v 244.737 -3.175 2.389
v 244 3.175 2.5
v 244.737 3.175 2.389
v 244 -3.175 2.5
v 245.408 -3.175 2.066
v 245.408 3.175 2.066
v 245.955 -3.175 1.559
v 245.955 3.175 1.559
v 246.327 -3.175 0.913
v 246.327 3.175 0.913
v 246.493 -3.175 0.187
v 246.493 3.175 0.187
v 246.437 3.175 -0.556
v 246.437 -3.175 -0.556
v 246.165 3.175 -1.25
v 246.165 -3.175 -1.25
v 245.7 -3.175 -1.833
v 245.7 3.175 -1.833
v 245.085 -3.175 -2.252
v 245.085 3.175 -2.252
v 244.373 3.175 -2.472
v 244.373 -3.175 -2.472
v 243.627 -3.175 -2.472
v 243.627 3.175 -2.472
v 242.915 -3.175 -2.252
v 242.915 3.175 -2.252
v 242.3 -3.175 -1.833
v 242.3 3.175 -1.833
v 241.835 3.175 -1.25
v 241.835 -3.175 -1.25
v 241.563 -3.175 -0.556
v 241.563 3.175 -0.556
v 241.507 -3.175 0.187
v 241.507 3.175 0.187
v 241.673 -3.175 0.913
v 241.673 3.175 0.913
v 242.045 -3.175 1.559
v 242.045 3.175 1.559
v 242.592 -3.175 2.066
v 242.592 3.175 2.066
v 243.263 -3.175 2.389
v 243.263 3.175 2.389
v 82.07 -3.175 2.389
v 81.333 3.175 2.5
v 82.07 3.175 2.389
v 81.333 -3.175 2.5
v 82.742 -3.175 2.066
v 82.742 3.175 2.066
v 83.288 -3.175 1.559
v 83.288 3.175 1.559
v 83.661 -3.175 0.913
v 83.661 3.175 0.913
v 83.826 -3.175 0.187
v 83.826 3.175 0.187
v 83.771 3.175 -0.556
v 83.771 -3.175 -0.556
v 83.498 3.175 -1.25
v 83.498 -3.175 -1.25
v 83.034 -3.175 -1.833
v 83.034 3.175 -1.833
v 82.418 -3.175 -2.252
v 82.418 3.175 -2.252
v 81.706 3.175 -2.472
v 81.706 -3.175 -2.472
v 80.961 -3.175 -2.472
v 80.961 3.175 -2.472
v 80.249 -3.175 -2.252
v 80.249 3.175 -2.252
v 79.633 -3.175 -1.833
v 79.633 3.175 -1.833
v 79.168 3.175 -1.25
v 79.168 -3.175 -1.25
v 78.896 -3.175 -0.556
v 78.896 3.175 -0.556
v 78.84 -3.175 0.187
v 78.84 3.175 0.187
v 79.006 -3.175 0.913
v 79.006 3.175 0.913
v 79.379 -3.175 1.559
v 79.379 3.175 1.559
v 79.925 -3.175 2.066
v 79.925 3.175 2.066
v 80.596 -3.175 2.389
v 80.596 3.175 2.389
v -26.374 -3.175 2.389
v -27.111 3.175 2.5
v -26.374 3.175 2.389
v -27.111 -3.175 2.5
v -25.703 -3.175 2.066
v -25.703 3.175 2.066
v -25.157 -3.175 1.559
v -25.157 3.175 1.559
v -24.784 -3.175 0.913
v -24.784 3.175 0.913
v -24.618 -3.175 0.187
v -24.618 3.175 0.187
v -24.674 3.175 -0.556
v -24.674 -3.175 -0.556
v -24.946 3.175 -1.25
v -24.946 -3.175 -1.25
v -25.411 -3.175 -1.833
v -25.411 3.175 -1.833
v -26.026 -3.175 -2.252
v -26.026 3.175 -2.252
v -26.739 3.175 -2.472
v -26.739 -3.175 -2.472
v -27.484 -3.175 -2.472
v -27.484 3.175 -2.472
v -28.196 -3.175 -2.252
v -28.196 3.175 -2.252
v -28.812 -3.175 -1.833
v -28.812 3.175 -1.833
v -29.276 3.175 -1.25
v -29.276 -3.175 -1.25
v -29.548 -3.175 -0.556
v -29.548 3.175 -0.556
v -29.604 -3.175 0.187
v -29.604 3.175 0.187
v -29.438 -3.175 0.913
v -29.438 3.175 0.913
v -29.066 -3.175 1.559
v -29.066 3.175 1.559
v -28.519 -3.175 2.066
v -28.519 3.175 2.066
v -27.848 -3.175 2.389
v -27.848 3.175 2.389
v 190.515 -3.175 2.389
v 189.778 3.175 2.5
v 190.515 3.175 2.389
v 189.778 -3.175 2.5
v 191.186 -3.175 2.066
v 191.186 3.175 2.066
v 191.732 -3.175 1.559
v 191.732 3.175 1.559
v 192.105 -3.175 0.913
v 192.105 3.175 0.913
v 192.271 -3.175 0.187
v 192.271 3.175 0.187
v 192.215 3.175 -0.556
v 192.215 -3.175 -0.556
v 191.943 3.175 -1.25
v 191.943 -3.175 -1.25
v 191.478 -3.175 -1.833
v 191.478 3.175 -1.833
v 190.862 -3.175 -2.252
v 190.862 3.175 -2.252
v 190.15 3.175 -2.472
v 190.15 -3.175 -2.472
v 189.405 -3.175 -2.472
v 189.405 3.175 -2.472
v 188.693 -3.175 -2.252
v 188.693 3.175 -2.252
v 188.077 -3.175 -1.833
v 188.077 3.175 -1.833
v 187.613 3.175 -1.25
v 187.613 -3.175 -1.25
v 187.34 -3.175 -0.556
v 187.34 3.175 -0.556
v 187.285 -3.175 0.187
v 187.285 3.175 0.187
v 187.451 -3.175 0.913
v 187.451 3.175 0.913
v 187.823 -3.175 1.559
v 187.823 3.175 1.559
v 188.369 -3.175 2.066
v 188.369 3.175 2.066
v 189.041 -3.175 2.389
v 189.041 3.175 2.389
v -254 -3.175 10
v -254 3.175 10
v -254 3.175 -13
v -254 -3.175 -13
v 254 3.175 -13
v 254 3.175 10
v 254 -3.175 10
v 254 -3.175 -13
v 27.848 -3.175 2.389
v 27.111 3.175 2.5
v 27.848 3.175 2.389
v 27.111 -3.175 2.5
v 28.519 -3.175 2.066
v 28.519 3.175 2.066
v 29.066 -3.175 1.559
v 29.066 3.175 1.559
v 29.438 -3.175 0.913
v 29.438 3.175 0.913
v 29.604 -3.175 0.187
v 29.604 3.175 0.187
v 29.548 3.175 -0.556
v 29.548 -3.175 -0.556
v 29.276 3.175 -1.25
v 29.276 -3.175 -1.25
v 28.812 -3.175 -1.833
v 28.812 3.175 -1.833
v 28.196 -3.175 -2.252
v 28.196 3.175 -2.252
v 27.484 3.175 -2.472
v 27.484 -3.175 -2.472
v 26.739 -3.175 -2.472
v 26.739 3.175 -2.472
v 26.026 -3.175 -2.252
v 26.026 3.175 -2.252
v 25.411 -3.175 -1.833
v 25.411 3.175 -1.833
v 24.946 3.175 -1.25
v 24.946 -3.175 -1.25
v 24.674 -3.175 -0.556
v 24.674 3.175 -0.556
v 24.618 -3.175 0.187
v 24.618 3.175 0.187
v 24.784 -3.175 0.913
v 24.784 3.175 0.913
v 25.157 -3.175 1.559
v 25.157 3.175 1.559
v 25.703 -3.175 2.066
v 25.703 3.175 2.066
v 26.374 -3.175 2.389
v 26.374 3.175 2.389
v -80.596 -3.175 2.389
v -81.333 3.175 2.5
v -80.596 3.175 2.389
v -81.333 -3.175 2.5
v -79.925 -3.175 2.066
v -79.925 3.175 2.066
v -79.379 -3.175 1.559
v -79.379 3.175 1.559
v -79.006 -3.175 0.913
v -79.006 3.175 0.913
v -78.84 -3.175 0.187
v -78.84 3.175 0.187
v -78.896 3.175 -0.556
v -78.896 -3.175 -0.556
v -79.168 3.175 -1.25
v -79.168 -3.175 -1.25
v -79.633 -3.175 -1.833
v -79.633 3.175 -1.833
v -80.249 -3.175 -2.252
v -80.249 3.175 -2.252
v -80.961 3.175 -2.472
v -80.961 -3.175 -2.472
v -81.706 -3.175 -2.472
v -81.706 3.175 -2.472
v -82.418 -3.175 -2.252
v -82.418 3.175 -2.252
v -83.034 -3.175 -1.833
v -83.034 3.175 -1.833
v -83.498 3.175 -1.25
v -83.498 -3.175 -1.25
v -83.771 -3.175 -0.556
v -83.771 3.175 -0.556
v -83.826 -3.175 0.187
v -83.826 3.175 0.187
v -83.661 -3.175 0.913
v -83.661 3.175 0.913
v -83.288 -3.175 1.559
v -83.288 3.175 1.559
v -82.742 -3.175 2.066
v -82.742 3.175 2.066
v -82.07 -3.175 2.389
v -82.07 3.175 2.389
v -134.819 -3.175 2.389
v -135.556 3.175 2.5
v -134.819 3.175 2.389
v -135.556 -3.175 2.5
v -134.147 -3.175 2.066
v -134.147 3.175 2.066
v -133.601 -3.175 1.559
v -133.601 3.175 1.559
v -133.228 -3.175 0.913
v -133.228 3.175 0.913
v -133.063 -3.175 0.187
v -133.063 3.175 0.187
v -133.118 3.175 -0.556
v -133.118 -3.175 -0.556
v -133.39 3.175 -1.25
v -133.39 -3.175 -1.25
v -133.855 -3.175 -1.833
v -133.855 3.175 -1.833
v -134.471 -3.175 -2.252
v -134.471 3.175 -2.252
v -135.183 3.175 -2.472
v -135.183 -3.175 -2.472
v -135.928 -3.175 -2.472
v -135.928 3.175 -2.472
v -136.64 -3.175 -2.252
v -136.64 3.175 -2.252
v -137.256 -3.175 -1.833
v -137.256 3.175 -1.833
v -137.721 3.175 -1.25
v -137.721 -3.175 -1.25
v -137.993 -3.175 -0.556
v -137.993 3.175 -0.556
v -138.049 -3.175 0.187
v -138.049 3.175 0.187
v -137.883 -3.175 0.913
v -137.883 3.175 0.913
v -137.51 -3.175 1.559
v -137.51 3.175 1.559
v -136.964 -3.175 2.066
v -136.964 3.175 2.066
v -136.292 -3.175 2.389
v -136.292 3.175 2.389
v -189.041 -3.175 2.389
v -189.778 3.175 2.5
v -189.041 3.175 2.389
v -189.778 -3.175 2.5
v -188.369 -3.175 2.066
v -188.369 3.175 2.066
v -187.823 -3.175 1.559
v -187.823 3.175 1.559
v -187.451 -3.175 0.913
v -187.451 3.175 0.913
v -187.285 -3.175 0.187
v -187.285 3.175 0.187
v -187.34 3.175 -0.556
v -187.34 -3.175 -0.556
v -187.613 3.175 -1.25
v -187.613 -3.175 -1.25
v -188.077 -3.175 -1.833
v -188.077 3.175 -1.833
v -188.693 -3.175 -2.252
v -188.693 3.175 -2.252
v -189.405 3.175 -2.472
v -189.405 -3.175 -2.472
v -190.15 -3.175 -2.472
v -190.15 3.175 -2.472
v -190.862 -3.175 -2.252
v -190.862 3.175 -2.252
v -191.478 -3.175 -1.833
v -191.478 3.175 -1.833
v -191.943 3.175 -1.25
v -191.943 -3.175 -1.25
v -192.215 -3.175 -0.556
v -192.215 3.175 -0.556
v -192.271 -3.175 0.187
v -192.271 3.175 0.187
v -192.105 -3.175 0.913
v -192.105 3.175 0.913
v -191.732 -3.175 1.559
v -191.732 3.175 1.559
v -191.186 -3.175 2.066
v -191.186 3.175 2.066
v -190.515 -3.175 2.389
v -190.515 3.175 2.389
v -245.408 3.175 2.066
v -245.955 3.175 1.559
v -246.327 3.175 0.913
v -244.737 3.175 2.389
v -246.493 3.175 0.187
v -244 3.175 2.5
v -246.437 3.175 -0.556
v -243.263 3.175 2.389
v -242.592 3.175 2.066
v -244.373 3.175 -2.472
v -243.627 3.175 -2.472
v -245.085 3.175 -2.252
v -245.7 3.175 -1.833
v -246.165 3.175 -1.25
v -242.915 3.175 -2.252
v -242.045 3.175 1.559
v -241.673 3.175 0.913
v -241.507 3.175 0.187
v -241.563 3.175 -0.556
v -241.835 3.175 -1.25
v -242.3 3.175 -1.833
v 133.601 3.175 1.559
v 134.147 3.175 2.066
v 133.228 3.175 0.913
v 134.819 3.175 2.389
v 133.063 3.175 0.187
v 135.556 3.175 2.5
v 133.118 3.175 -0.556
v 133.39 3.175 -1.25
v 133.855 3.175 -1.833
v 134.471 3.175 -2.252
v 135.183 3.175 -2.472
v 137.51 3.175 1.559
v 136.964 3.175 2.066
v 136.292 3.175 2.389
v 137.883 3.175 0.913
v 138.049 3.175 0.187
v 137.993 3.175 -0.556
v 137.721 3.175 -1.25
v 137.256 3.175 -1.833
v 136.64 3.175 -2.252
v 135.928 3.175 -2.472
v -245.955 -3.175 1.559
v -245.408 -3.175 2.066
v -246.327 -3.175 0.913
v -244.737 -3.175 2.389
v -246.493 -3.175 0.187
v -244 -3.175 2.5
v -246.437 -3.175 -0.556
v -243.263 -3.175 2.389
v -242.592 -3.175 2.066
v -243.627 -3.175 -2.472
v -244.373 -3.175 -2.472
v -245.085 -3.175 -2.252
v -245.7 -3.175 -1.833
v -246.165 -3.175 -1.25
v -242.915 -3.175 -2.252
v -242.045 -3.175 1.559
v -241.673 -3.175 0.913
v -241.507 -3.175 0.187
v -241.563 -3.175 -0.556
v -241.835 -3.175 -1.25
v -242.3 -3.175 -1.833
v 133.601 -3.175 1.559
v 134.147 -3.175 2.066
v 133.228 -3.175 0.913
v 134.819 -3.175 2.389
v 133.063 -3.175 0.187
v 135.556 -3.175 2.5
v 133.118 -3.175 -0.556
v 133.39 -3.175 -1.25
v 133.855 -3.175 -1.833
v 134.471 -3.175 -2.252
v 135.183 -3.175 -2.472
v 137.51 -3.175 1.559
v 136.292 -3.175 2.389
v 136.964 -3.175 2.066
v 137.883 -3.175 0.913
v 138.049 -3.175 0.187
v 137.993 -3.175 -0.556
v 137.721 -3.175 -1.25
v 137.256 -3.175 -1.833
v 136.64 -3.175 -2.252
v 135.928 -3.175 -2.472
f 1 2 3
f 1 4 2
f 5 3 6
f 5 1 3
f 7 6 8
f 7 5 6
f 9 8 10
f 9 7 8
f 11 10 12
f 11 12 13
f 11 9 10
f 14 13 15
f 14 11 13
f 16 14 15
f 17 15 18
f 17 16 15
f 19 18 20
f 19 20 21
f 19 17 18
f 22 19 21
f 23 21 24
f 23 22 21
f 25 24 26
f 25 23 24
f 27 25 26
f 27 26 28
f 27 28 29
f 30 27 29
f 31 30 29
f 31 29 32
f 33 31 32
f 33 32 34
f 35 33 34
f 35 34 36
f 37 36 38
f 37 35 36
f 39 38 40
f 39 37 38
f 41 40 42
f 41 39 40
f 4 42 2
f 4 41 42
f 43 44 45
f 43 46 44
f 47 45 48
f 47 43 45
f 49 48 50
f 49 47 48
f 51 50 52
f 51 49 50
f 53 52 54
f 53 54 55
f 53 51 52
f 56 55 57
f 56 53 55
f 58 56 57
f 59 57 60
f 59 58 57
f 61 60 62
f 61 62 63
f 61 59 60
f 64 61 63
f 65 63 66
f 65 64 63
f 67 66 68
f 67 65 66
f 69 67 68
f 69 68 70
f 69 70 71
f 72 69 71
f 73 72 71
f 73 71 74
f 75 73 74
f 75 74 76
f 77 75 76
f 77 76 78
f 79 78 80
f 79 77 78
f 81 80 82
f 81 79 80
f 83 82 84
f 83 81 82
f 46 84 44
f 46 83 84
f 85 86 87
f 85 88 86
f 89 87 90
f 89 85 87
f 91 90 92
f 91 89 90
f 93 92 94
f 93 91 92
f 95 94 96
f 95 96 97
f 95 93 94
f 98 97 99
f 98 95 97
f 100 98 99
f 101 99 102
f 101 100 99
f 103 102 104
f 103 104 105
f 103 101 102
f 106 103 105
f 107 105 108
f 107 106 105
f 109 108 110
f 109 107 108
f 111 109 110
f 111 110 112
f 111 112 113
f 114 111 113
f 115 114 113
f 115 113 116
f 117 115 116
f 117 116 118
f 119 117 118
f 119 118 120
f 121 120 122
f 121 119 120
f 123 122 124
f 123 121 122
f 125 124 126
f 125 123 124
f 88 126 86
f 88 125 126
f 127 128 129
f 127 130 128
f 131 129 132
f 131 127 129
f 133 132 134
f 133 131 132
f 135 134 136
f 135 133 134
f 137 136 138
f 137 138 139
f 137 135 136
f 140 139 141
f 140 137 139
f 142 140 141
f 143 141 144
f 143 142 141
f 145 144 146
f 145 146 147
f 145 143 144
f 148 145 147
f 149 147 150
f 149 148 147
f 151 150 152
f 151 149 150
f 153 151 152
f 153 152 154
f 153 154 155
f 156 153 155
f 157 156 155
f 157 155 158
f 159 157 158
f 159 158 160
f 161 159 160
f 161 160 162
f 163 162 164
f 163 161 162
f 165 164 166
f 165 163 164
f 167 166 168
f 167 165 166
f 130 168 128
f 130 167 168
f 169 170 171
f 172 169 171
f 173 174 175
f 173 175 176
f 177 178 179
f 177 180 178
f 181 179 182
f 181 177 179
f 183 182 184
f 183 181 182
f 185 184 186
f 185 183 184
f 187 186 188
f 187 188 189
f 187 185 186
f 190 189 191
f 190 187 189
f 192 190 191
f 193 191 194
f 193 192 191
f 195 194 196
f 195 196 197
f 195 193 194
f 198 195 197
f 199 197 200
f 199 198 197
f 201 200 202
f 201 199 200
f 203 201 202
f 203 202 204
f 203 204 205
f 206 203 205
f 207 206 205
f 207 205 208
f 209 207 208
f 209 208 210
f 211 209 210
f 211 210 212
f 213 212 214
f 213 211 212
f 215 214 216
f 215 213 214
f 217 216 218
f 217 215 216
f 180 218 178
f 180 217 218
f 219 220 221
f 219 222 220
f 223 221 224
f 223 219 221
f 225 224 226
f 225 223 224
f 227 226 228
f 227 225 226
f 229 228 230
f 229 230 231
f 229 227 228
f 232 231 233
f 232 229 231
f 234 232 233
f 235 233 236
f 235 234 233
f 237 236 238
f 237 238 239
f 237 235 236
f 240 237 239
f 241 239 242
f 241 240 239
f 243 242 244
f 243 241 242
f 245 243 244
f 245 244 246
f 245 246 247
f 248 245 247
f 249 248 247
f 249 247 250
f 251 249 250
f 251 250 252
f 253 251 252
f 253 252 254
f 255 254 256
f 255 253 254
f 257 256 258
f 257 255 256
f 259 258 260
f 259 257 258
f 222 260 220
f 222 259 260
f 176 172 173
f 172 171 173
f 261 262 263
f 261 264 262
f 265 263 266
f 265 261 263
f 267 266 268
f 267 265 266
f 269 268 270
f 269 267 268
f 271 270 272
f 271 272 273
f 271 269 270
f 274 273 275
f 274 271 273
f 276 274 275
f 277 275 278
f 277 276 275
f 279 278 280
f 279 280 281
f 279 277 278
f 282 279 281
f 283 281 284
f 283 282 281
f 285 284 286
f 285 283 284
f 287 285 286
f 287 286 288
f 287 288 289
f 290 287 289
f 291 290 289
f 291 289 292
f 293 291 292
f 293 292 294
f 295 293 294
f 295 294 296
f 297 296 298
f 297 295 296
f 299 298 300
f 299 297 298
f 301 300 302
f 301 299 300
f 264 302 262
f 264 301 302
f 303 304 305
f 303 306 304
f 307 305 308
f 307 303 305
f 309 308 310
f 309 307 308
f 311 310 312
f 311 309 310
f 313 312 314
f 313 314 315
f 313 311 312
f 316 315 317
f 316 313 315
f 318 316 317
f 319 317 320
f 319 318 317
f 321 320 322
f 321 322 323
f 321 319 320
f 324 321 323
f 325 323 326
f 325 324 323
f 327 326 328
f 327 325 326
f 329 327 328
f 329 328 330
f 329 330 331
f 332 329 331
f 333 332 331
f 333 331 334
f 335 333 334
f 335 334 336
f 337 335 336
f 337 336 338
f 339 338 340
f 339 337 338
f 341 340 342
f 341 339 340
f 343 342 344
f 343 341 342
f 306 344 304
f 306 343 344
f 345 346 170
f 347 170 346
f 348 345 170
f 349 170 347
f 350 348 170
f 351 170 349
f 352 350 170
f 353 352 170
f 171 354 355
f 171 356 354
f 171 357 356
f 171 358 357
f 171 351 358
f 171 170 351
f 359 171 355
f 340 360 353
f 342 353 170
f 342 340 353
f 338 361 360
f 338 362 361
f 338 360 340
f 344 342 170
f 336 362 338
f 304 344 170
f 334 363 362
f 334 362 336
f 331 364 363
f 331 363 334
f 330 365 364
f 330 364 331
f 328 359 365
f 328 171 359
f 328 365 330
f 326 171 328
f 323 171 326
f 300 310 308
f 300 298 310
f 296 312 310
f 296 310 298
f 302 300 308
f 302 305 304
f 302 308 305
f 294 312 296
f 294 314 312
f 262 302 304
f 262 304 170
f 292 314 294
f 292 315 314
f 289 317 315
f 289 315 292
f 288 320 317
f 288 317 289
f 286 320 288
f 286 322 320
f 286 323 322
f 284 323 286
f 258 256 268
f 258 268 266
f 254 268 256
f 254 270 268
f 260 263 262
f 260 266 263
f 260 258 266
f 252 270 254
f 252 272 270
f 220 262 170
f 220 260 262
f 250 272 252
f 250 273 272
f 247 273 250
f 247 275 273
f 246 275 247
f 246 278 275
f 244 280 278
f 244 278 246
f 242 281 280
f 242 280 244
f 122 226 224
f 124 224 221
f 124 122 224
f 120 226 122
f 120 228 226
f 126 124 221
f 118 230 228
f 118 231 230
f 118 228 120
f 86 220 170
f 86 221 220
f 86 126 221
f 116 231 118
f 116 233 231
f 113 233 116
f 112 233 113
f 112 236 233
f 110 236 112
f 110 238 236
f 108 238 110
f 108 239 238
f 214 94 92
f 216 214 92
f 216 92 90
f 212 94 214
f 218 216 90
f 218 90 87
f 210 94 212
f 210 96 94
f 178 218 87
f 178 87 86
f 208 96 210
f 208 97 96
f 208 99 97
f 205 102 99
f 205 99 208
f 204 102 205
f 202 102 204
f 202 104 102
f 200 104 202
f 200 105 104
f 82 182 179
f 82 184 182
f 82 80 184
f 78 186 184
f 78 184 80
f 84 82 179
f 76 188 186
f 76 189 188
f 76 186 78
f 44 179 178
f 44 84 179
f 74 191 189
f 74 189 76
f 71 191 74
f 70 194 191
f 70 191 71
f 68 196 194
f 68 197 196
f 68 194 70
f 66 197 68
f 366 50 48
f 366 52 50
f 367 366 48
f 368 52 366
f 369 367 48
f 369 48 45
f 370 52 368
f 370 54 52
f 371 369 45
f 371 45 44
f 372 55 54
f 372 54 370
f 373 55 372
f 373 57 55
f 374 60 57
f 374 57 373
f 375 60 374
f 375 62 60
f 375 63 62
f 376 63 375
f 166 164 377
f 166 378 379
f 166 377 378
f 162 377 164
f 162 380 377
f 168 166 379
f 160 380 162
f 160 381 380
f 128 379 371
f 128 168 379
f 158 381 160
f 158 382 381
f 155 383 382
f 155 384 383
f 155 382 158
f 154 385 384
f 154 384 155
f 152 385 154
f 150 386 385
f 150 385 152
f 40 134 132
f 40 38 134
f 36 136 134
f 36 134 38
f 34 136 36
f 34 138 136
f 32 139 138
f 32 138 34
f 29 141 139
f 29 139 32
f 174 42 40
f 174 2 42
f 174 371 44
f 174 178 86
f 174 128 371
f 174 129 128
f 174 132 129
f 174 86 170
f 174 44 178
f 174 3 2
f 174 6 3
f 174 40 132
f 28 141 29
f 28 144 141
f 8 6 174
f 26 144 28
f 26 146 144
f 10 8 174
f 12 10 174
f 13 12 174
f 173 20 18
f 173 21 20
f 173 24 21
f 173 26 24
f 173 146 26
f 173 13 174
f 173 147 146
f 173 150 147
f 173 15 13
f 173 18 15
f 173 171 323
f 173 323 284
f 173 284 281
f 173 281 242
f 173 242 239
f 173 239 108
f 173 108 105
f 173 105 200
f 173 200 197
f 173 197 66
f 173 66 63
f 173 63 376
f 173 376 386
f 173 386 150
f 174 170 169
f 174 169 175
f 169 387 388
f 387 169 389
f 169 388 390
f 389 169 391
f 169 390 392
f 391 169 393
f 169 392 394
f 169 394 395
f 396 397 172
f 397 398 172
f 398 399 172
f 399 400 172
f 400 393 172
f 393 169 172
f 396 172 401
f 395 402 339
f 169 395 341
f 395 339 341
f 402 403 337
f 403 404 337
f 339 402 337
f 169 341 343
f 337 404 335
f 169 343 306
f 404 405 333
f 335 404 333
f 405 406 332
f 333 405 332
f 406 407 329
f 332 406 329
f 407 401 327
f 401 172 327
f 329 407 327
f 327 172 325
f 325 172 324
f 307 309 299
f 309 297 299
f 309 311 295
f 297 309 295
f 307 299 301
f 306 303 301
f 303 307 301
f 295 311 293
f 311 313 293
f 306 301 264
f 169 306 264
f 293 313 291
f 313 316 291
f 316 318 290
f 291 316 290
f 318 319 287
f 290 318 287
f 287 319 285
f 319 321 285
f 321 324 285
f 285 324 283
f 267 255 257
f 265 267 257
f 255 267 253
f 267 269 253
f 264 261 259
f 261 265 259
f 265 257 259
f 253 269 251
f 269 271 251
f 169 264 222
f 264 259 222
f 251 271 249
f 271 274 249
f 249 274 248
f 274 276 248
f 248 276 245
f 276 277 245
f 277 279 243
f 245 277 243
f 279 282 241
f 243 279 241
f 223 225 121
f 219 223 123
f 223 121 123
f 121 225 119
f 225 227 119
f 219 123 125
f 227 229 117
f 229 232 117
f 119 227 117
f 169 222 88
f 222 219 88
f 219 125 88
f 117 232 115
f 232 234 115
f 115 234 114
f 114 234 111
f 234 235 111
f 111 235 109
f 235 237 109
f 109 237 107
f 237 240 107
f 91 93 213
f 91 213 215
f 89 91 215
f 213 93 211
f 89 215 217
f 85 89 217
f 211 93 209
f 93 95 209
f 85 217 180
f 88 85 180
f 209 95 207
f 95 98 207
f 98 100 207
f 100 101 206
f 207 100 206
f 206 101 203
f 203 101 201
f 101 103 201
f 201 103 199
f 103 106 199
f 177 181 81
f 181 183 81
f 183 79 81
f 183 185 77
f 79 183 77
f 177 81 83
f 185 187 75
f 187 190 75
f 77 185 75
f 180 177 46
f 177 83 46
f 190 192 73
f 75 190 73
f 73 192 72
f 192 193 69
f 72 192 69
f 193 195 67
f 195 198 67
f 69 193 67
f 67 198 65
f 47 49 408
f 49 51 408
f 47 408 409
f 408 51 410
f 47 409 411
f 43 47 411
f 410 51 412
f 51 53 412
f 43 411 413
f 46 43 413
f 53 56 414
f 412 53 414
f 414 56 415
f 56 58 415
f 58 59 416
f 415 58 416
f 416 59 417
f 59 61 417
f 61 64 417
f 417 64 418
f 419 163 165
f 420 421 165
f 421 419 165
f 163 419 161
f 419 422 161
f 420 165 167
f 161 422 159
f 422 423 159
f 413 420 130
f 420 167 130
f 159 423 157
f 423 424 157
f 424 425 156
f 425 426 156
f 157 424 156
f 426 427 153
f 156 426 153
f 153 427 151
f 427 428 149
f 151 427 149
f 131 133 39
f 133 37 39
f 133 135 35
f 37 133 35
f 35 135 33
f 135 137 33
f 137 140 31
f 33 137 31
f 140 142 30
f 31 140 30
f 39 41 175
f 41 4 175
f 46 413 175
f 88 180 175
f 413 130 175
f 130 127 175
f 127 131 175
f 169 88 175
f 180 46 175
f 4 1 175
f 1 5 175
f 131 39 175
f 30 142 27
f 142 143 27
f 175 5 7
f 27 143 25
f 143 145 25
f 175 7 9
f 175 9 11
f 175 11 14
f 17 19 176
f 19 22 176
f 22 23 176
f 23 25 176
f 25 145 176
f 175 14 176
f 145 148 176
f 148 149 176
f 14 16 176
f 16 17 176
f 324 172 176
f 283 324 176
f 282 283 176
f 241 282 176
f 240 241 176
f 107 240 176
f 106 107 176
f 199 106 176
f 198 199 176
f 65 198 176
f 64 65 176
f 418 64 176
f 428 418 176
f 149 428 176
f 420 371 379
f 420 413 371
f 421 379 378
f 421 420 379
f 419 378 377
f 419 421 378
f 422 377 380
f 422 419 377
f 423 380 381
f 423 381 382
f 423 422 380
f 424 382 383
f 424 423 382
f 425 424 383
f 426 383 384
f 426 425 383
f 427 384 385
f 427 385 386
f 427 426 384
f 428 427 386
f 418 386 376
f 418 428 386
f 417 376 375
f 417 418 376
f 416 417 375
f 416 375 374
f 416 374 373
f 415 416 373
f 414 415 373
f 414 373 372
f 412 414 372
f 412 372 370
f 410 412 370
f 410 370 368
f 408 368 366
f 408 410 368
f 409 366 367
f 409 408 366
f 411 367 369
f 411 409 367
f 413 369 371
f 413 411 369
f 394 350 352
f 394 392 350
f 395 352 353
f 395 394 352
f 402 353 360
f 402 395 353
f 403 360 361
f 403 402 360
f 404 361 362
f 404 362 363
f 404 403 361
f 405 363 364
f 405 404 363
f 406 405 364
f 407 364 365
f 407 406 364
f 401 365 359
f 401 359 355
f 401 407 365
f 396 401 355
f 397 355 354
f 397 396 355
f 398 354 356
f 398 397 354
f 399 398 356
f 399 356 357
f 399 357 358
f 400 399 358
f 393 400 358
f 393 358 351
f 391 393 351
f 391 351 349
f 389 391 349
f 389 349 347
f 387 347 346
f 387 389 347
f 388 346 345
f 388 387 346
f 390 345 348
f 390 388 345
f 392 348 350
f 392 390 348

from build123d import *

# Parameters (mm, degrees)
SKETCH1_W           = 508
SKETCH1_H           = 23
SKETCH1_R           = 2.5
BOSS_EXTRUDE1_DEPTH = 3.175


with BuildPart() as part:
    # Sketch1 → Boss-Extrude1 (new, symmetric)
    with BuildSketch(Plane(origin=(0, 0, 0), x_dir=(1, 0, 0), z_dir=(0, 1, 0))):
        with Locations((0, 1.5)):
            Rectangle(SKETCH1_W, SKETCH1_H)
        with Locations(Location((-244, 0, 0), (0, 0, 270))):
            Circle(SKETCH1_R, mode=Mode.SUBTRACT)
        with Locations(Location((-189.777777778, 0, 0), (0, 0, 270))):
            Circle(SKETCH1_R, mode=Mode.SUBTRACT)
        with Locations(Location((-135.555555556, 0, 0), (0, 0, 270))):
            Circle(SKETCH1_R, mode=Mode.SUBTRACT)
        with Locations(Location((-81.333333333, 0, 0), (0, 0, 270))):
            Circle(SKETCH1_R, mode=Mode.SUBTRACT)
        with Locations(Location((-27.111111111, 0, 0), (0, 0, 270))):
            Circle(SKETCH1_R, mode=Mode.SUBTRACT)
        with Locations(Location((27.111111111, 0, 0), (0, 0, 270))):
            Circle(SKETCH1_R, mode=Mode.SUBTRACT)
        with Locations(Location((81.333333333, 0, 0), (0, 0, 270))):
            Circle(SKETCH1_R, mode=Mode.SUBTRACT)
        with Locations(Location((135.555555556, 0, 0), (0, 0, 270))):
            Circle(SKETCH1_R, mode=Mode.SUBTRACT)
        with Locations(Location((189.777777778, 0, 0), (0, 0, 270))):
            Circle(SKETCH1_R, mode=Mode.SUBTRACT)
        with Locations(Location((244, 0, 0), (0, 0, 270))):
            Circle(SKETCH1_R, mode=Mode.SUBTRACT)
    extrude(amount=BOSS_EXTRUDE1_DEPTH, both=True)


solid = part.part
